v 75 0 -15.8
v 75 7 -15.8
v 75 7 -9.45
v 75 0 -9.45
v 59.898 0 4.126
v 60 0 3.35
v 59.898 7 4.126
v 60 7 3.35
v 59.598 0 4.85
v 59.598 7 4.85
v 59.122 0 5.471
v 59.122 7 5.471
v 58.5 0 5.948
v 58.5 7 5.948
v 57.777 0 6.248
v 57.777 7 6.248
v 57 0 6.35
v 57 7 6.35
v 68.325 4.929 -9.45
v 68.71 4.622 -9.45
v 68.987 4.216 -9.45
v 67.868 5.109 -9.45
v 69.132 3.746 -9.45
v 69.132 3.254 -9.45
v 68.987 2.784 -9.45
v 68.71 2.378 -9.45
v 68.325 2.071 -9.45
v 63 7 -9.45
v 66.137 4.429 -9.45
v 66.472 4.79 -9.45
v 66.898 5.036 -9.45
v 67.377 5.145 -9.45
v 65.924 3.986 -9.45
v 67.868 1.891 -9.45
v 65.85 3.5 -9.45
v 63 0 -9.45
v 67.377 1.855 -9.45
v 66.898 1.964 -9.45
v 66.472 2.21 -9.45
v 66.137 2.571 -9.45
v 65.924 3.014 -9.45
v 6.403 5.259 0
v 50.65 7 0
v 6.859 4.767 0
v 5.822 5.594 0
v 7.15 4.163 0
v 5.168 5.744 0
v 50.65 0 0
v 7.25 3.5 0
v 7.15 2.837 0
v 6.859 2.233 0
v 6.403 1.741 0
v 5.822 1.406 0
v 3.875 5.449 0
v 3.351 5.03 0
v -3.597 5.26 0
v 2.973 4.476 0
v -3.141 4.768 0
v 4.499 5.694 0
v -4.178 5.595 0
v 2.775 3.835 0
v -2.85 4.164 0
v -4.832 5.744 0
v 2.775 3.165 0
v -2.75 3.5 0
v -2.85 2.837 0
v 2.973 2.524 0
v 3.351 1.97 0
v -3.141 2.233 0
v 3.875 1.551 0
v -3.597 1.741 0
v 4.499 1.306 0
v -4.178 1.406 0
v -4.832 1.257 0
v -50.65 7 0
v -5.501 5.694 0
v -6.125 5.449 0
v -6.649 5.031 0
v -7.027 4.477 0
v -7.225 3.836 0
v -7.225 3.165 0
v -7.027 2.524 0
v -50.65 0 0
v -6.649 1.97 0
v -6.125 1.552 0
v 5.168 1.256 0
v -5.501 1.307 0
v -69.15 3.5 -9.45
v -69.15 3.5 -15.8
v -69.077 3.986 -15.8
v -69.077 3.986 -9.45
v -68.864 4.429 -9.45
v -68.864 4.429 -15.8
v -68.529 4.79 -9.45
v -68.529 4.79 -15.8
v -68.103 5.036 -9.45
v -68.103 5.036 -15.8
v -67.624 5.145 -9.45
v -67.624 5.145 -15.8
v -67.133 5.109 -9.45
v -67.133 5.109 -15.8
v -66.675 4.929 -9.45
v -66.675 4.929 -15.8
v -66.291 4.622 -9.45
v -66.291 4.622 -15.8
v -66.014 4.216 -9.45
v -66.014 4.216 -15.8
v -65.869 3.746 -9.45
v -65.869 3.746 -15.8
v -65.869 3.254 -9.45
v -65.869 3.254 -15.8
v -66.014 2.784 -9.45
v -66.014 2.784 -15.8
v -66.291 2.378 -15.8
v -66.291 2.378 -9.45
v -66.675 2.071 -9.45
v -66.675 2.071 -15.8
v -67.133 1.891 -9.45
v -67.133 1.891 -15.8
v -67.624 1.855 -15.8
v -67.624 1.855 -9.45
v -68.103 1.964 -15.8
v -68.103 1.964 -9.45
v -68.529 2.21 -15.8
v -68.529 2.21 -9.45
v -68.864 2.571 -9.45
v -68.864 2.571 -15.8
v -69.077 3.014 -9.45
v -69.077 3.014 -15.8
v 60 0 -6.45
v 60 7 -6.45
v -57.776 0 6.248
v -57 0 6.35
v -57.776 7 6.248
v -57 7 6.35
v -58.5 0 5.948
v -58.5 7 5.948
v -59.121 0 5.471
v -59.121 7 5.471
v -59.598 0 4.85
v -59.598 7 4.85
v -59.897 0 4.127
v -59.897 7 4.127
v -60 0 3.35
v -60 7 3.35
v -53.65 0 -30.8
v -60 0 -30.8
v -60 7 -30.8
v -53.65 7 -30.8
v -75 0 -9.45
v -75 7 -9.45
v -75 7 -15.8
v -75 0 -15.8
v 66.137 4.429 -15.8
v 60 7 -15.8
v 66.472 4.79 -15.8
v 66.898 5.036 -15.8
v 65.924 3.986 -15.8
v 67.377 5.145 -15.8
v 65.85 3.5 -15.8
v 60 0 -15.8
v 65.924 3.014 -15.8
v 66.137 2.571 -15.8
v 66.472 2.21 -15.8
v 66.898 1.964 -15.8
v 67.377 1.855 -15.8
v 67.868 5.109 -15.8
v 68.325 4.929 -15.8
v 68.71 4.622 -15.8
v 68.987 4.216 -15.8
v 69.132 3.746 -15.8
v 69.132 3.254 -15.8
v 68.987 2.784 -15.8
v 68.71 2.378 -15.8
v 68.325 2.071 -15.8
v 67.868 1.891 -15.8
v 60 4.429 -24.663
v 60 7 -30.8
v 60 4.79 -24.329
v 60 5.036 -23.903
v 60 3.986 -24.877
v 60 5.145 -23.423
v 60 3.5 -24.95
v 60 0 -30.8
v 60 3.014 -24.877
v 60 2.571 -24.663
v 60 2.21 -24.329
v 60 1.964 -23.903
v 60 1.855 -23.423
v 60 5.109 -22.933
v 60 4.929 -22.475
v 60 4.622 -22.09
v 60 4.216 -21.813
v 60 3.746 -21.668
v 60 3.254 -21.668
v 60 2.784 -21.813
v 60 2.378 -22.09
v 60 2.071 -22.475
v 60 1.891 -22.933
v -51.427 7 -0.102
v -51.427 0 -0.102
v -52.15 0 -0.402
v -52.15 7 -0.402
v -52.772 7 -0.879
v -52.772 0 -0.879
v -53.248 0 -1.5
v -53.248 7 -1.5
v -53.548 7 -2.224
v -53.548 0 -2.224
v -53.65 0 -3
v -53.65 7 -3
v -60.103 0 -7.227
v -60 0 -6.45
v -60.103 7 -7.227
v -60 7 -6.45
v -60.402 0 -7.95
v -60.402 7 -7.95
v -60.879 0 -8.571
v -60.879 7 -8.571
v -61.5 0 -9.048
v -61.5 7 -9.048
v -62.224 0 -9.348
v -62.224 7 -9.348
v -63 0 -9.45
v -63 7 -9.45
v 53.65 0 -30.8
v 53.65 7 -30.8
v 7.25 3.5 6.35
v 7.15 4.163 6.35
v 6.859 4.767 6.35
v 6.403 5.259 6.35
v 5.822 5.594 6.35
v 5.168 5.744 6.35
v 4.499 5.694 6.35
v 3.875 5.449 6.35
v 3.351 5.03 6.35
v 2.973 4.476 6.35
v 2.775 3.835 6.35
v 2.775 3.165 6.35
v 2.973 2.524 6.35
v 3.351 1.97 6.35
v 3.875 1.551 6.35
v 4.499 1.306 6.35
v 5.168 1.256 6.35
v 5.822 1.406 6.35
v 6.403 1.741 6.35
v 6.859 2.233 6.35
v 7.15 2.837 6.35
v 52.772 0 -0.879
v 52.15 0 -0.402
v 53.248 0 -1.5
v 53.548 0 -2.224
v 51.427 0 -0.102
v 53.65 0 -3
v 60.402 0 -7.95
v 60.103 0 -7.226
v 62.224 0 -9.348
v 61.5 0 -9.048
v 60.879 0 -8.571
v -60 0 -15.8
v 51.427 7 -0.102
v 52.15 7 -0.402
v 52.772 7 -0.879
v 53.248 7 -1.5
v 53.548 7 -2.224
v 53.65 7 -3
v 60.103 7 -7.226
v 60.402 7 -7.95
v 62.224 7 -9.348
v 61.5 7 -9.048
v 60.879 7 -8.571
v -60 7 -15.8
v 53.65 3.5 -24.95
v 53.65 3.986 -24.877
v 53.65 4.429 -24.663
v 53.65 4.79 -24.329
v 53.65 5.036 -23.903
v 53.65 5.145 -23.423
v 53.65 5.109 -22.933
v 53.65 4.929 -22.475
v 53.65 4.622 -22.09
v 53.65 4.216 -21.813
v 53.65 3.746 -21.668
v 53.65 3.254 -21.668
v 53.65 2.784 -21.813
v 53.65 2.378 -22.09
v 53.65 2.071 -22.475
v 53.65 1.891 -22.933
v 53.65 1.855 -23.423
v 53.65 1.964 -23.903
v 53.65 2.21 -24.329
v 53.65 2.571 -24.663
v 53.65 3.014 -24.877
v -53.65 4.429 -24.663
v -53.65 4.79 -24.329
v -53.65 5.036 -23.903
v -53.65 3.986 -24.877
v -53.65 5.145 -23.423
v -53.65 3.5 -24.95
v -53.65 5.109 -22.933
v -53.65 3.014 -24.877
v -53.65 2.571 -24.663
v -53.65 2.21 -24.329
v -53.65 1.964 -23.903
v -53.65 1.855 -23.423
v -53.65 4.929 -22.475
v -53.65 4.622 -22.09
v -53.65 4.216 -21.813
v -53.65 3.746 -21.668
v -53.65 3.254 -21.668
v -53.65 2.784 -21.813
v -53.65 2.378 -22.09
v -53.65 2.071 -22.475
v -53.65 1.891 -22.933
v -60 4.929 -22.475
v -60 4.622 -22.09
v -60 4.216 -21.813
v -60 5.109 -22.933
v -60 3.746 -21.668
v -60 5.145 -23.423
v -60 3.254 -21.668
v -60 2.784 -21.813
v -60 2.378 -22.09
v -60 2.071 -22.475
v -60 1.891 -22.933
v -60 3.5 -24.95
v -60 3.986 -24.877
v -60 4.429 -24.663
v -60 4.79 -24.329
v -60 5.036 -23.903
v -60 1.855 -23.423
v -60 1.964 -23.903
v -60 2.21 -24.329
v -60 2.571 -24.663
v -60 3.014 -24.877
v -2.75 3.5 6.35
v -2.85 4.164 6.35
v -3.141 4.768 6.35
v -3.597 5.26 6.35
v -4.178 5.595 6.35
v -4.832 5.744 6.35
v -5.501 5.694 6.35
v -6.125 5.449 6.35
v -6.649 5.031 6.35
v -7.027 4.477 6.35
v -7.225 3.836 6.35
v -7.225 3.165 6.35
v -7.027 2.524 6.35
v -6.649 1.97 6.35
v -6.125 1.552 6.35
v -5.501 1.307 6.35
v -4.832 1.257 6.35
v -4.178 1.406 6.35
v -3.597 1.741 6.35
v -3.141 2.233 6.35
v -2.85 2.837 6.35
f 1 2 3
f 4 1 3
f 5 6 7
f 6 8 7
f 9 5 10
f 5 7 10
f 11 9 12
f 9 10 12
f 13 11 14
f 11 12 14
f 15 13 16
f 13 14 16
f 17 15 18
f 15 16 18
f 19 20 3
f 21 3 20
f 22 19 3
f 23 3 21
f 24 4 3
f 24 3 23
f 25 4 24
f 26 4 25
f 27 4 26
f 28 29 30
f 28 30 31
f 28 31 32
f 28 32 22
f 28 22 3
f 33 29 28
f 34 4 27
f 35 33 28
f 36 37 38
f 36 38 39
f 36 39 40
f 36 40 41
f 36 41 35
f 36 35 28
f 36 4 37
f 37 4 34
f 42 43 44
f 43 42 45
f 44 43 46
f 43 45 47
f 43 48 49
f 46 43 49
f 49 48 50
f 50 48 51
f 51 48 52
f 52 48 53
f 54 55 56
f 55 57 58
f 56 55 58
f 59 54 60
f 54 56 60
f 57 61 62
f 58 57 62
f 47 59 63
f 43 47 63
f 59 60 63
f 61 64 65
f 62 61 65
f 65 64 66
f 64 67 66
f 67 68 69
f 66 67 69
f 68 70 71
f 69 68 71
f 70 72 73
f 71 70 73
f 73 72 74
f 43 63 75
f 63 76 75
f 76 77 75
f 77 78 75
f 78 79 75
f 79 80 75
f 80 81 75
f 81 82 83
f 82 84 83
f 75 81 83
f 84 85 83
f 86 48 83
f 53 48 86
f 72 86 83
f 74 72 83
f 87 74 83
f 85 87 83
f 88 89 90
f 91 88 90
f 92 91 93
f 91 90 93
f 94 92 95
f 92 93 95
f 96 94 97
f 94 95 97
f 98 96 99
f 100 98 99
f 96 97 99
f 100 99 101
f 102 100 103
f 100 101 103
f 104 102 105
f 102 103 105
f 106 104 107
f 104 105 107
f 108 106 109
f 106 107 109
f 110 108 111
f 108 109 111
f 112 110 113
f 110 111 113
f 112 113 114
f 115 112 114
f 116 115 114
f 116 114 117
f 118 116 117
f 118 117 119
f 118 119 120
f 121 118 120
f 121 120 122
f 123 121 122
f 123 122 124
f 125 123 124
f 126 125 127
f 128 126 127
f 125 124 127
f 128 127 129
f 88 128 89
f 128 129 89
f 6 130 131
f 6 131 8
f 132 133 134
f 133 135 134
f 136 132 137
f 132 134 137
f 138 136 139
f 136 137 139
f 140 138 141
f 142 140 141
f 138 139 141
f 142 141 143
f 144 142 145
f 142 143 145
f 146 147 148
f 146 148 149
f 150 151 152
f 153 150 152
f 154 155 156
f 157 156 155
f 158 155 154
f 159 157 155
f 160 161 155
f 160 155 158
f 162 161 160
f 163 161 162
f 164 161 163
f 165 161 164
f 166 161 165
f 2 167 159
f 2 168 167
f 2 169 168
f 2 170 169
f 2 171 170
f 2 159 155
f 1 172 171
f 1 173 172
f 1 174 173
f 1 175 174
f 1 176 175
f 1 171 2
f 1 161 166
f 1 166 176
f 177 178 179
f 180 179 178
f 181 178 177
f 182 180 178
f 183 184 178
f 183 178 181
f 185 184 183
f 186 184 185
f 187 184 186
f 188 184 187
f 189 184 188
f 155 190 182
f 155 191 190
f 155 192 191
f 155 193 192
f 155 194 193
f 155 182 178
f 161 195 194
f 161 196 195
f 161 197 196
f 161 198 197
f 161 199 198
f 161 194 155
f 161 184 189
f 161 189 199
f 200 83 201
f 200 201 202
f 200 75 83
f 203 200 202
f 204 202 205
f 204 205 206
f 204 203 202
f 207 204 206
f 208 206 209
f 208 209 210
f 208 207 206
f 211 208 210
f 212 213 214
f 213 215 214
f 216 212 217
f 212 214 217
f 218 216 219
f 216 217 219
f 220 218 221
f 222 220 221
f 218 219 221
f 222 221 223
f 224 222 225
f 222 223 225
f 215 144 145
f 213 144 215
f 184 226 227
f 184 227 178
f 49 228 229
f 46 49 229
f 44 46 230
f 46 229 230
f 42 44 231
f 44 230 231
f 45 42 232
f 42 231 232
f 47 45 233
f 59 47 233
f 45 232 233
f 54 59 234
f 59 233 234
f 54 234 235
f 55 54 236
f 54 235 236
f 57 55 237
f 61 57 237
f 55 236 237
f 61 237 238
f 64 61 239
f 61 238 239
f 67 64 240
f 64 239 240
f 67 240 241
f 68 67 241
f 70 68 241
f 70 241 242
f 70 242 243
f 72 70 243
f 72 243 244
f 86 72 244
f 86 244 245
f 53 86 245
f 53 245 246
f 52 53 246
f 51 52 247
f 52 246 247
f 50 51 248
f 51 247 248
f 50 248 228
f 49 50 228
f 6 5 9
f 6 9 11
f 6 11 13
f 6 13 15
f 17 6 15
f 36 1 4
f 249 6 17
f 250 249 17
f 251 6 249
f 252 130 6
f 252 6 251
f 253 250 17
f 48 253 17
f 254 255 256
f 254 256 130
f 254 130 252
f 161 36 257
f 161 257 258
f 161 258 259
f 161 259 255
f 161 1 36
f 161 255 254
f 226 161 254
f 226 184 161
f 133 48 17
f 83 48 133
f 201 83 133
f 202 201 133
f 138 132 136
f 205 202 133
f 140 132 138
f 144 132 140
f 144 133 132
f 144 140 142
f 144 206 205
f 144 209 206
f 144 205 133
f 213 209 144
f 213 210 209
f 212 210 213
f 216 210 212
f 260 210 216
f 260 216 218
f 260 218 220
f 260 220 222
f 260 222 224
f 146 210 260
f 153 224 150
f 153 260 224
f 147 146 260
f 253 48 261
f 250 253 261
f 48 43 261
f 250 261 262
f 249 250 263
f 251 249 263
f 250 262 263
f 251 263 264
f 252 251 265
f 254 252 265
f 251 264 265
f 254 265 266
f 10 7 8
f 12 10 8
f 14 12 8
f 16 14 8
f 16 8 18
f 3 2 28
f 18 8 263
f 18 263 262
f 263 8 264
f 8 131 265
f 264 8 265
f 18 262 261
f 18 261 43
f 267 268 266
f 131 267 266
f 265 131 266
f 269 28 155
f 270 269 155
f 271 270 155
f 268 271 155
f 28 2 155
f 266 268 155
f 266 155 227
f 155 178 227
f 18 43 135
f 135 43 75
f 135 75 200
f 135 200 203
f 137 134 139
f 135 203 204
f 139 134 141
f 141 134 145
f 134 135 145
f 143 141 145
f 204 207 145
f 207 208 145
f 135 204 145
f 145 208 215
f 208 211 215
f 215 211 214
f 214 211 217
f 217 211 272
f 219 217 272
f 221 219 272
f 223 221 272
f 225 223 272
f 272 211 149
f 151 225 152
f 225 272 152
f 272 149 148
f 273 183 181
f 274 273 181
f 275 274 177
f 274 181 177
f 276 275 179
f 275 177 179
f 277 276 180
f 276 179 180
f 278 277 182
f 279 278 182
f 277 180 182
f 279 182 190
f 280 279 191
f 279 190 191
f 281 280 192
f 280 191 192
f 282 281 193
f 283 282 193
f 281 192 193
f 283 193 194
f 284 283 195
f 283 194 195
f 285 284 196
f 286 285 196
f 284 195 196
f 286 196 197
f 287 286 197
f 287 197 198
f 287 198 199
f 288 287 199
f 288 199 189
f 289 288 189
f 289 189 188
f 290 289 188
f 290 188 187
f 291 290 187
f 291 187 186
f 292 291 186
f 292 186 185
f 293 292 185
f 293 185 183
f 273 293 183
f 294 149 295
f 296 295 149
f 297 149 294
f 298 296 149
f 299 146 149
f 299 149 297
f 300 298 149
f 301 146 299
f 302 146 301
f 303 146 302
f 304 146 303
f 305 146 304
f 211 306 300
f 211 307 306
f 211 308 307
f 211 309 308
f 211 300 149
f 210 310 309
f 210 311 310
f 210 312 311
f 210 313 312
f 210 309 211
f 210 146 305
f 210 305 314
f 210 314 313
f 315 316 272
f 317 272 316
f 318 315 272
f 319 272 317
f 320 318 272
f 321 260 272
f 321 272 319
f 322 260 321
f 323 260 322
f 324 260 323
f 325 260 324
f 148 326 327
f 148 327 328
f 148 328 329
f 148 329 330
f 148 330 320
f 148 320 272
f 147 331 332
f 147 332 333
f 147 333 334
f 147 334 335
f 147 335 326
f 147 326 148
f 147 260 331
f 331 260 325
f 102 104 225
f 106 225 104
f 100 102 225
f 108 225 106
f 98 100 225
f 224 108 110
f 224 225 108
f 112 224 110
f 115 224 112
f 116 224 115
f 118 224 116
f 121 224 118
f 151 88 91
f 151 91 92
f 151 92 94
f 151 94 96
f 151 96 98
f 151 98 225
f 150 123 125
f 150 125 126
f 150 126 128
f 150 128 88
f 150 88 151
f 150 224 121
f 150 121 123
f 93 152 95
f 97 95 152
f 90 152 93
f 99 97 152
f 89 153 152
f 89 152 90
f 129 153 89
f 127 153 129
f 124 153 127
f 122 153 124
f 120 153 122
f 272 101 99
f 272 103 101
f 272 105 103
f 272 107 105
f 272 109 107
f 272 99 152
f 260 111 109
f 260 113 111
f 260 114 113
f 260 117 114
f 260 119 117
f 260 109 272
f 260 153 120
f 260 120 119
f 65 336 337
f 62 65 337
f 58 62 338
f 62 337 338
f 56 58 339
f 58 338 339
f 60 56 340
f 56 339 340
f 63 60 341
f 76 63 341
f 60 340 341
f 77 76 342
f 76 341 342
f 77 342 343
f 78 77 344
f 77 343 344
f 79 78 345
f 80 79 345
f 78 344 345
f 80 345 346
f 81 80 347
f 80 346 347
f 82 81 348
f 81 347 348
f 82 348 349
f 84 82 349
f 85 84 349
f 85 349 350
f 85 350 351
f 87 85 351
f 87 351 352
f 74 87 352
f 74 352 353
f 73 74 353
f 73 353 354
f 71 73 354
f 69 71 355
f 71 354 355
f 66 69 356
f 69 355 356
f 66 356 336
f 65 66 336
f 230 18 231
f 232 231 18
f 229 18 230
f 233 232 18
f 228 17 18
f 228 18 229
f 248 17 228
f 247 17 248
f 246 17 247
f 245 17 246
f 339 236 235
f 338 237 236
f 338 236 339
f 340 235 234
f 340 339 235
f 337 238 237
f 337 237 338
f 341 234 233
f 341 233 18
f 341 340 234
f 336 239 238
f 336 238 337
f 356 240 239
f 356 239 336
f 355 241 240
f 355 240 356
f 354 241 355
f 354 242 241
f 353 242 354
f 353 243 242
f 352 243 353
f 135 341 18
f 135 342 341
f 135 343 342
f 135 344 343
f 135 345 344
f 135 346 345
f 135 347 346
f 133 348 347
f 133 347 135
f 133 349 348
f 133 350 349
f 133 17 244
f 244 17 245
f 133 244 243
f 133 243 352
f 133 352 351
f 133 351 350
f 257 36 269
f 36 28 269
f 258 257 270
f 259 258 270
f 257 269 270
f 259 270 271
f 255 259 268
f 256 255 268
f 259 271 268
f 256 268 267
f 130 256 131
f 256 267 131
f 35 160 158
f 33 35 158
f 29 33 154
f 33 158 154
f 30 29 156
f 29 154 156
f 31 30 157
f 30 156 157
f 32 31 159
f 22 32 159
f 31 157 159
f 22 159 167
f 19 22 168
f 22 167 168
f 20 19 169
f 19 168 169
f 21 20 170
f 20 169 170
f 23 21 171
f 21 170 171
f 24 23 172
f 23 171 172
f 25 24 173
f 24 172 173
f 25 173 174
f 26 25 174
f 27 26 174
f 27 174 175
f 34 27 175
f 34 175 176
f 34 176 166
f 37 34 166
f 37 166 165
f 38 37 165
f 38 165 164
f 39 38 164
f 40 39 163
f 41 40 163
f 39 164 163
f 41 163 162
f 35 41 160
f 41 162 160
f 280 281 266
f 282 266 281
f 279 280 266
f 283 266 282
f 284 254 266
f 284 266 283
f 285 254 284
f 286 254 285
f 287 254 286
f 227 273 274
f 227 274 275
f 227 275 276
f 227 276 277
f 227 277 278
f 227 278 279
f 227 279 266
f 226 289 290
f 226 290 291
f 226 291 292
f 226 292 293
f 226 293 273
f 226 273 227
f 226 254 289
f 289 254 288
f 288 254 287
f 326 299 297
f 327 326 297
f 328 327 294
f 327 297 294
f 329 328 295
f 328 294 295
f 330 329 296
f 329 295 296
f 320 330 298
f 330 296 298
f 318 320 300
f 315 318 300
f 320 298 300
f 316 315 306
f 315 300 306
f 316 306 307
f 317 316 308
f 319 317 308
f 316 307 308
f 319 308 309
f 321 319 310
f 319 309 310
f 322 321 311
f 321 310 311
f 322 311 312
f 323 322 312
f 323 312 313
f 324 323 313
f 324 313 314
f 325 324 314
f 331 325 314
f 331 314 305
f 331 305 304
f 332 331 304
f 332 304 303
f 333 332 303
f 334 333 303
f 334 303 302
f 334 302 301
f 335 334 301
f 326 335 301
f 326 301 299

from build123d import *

# Parameters (mm, degrees)
BOSS_EXTRUDE1_DEPTH = 7
SKETCH2_R           = 1.65
CUT_EXTRUDE1_DEPTH  = 139.646530772
SKETCH3_R           = 1.65
CUT_EXTRUDE2_DEPTH  = 6.35
FILLET1_R           = 3
SKETCH4_R           = 2.25
CUT_EXTRUDE3_DEPTH  = 6.35


with BuildPart() as part:
    # Sketch1 → Boss-Extrude1 (new body)
    with BuildSketch(Plane(origin=(0, 0, 0), x_dir=(1, 0, 0), z_dir=(0, 1, 0))):
        Polygon((0, 0), (53.650408323, 0), (53.650408323, 30.8), (60.000408323, 30.8), (60.000408323, 15.8), (75.000408323, 15.8), (75.000408323, 9.45), (60.000408323, 9.45), (60.000408323, -6.35), (-59.999591677, -6.35), (-60.000408323, 9.45), (-75.000408323, 9.45), (-75.000408323, 15.8), (-60.000408323, 15.8), (-60.000408323, 30.8), (-53.650408323, 30.8), (-53.650408323, 0), align=None)
    extrude(amount=BOSS_EXTRUDE1_DEPTH)

    # Sketch2 → Cut-Extrude1 (cut, through all)
    with BuildSketch(Plane(origin=(60.000408323, 0, 0), x_dir=(0, 0, -1), z_dir=(1, 0, 0))):
        with Locations((23.3, 3.5)):
            Circle(SKETCH2_R)
    extrude(amount=-CUT_EXTRUDE1_DEPTH, mode=Mode.SUBTRACT)

    # Sketch3 → Cut-Extrude2 (cut)
    with BuildSketch(Plane(origin=(0, 0, -15.8), x_dir=(-1, 0, 0), z_dir=(0, 0, -1))):
        with Locations((-67.500408323, 3.5)):
            Circle(SKETCH3_R)
        with Locations((67.500408323, 3.5)):
            Circle(SKETCH3_R)
    extrude(amount=-CUT_EXTRUDE2_DEPTH, mode=Mode.SUBTRACT)

    # Fillet1
    fillet1_edges = [part.edges().sort_by_distance(p)[0] for p in [
        (53.650408323, 3.5, 0),
        (60.000408323, 3.5, -9.45),
        (60.000408323, 3.5, 6.35),
        (-59.999591677, 3.5, 6.35),
        (-60.000408323, 3.5, -9.45),
        (-53.650408323, 3.5, 0),
    ]]
    fillet(fillet1_edges, radius=FILLET1_R)

    # Sketch4 → Cut-Extrude3 (cut)
    with BuildSketch(Plane.XY.offset(6.35)):
        with Locations((5.000165403, 3.5)):
            Circle(SKETCH4_R)
        with Locations((-4.999834586, 3.500472565)):
            Circle(SKETCH4_R)
    extrude(amount=-CUT_EXTRUDE3_DEPTH, mode=Mode.SUBTRACT)


solid = part.part
